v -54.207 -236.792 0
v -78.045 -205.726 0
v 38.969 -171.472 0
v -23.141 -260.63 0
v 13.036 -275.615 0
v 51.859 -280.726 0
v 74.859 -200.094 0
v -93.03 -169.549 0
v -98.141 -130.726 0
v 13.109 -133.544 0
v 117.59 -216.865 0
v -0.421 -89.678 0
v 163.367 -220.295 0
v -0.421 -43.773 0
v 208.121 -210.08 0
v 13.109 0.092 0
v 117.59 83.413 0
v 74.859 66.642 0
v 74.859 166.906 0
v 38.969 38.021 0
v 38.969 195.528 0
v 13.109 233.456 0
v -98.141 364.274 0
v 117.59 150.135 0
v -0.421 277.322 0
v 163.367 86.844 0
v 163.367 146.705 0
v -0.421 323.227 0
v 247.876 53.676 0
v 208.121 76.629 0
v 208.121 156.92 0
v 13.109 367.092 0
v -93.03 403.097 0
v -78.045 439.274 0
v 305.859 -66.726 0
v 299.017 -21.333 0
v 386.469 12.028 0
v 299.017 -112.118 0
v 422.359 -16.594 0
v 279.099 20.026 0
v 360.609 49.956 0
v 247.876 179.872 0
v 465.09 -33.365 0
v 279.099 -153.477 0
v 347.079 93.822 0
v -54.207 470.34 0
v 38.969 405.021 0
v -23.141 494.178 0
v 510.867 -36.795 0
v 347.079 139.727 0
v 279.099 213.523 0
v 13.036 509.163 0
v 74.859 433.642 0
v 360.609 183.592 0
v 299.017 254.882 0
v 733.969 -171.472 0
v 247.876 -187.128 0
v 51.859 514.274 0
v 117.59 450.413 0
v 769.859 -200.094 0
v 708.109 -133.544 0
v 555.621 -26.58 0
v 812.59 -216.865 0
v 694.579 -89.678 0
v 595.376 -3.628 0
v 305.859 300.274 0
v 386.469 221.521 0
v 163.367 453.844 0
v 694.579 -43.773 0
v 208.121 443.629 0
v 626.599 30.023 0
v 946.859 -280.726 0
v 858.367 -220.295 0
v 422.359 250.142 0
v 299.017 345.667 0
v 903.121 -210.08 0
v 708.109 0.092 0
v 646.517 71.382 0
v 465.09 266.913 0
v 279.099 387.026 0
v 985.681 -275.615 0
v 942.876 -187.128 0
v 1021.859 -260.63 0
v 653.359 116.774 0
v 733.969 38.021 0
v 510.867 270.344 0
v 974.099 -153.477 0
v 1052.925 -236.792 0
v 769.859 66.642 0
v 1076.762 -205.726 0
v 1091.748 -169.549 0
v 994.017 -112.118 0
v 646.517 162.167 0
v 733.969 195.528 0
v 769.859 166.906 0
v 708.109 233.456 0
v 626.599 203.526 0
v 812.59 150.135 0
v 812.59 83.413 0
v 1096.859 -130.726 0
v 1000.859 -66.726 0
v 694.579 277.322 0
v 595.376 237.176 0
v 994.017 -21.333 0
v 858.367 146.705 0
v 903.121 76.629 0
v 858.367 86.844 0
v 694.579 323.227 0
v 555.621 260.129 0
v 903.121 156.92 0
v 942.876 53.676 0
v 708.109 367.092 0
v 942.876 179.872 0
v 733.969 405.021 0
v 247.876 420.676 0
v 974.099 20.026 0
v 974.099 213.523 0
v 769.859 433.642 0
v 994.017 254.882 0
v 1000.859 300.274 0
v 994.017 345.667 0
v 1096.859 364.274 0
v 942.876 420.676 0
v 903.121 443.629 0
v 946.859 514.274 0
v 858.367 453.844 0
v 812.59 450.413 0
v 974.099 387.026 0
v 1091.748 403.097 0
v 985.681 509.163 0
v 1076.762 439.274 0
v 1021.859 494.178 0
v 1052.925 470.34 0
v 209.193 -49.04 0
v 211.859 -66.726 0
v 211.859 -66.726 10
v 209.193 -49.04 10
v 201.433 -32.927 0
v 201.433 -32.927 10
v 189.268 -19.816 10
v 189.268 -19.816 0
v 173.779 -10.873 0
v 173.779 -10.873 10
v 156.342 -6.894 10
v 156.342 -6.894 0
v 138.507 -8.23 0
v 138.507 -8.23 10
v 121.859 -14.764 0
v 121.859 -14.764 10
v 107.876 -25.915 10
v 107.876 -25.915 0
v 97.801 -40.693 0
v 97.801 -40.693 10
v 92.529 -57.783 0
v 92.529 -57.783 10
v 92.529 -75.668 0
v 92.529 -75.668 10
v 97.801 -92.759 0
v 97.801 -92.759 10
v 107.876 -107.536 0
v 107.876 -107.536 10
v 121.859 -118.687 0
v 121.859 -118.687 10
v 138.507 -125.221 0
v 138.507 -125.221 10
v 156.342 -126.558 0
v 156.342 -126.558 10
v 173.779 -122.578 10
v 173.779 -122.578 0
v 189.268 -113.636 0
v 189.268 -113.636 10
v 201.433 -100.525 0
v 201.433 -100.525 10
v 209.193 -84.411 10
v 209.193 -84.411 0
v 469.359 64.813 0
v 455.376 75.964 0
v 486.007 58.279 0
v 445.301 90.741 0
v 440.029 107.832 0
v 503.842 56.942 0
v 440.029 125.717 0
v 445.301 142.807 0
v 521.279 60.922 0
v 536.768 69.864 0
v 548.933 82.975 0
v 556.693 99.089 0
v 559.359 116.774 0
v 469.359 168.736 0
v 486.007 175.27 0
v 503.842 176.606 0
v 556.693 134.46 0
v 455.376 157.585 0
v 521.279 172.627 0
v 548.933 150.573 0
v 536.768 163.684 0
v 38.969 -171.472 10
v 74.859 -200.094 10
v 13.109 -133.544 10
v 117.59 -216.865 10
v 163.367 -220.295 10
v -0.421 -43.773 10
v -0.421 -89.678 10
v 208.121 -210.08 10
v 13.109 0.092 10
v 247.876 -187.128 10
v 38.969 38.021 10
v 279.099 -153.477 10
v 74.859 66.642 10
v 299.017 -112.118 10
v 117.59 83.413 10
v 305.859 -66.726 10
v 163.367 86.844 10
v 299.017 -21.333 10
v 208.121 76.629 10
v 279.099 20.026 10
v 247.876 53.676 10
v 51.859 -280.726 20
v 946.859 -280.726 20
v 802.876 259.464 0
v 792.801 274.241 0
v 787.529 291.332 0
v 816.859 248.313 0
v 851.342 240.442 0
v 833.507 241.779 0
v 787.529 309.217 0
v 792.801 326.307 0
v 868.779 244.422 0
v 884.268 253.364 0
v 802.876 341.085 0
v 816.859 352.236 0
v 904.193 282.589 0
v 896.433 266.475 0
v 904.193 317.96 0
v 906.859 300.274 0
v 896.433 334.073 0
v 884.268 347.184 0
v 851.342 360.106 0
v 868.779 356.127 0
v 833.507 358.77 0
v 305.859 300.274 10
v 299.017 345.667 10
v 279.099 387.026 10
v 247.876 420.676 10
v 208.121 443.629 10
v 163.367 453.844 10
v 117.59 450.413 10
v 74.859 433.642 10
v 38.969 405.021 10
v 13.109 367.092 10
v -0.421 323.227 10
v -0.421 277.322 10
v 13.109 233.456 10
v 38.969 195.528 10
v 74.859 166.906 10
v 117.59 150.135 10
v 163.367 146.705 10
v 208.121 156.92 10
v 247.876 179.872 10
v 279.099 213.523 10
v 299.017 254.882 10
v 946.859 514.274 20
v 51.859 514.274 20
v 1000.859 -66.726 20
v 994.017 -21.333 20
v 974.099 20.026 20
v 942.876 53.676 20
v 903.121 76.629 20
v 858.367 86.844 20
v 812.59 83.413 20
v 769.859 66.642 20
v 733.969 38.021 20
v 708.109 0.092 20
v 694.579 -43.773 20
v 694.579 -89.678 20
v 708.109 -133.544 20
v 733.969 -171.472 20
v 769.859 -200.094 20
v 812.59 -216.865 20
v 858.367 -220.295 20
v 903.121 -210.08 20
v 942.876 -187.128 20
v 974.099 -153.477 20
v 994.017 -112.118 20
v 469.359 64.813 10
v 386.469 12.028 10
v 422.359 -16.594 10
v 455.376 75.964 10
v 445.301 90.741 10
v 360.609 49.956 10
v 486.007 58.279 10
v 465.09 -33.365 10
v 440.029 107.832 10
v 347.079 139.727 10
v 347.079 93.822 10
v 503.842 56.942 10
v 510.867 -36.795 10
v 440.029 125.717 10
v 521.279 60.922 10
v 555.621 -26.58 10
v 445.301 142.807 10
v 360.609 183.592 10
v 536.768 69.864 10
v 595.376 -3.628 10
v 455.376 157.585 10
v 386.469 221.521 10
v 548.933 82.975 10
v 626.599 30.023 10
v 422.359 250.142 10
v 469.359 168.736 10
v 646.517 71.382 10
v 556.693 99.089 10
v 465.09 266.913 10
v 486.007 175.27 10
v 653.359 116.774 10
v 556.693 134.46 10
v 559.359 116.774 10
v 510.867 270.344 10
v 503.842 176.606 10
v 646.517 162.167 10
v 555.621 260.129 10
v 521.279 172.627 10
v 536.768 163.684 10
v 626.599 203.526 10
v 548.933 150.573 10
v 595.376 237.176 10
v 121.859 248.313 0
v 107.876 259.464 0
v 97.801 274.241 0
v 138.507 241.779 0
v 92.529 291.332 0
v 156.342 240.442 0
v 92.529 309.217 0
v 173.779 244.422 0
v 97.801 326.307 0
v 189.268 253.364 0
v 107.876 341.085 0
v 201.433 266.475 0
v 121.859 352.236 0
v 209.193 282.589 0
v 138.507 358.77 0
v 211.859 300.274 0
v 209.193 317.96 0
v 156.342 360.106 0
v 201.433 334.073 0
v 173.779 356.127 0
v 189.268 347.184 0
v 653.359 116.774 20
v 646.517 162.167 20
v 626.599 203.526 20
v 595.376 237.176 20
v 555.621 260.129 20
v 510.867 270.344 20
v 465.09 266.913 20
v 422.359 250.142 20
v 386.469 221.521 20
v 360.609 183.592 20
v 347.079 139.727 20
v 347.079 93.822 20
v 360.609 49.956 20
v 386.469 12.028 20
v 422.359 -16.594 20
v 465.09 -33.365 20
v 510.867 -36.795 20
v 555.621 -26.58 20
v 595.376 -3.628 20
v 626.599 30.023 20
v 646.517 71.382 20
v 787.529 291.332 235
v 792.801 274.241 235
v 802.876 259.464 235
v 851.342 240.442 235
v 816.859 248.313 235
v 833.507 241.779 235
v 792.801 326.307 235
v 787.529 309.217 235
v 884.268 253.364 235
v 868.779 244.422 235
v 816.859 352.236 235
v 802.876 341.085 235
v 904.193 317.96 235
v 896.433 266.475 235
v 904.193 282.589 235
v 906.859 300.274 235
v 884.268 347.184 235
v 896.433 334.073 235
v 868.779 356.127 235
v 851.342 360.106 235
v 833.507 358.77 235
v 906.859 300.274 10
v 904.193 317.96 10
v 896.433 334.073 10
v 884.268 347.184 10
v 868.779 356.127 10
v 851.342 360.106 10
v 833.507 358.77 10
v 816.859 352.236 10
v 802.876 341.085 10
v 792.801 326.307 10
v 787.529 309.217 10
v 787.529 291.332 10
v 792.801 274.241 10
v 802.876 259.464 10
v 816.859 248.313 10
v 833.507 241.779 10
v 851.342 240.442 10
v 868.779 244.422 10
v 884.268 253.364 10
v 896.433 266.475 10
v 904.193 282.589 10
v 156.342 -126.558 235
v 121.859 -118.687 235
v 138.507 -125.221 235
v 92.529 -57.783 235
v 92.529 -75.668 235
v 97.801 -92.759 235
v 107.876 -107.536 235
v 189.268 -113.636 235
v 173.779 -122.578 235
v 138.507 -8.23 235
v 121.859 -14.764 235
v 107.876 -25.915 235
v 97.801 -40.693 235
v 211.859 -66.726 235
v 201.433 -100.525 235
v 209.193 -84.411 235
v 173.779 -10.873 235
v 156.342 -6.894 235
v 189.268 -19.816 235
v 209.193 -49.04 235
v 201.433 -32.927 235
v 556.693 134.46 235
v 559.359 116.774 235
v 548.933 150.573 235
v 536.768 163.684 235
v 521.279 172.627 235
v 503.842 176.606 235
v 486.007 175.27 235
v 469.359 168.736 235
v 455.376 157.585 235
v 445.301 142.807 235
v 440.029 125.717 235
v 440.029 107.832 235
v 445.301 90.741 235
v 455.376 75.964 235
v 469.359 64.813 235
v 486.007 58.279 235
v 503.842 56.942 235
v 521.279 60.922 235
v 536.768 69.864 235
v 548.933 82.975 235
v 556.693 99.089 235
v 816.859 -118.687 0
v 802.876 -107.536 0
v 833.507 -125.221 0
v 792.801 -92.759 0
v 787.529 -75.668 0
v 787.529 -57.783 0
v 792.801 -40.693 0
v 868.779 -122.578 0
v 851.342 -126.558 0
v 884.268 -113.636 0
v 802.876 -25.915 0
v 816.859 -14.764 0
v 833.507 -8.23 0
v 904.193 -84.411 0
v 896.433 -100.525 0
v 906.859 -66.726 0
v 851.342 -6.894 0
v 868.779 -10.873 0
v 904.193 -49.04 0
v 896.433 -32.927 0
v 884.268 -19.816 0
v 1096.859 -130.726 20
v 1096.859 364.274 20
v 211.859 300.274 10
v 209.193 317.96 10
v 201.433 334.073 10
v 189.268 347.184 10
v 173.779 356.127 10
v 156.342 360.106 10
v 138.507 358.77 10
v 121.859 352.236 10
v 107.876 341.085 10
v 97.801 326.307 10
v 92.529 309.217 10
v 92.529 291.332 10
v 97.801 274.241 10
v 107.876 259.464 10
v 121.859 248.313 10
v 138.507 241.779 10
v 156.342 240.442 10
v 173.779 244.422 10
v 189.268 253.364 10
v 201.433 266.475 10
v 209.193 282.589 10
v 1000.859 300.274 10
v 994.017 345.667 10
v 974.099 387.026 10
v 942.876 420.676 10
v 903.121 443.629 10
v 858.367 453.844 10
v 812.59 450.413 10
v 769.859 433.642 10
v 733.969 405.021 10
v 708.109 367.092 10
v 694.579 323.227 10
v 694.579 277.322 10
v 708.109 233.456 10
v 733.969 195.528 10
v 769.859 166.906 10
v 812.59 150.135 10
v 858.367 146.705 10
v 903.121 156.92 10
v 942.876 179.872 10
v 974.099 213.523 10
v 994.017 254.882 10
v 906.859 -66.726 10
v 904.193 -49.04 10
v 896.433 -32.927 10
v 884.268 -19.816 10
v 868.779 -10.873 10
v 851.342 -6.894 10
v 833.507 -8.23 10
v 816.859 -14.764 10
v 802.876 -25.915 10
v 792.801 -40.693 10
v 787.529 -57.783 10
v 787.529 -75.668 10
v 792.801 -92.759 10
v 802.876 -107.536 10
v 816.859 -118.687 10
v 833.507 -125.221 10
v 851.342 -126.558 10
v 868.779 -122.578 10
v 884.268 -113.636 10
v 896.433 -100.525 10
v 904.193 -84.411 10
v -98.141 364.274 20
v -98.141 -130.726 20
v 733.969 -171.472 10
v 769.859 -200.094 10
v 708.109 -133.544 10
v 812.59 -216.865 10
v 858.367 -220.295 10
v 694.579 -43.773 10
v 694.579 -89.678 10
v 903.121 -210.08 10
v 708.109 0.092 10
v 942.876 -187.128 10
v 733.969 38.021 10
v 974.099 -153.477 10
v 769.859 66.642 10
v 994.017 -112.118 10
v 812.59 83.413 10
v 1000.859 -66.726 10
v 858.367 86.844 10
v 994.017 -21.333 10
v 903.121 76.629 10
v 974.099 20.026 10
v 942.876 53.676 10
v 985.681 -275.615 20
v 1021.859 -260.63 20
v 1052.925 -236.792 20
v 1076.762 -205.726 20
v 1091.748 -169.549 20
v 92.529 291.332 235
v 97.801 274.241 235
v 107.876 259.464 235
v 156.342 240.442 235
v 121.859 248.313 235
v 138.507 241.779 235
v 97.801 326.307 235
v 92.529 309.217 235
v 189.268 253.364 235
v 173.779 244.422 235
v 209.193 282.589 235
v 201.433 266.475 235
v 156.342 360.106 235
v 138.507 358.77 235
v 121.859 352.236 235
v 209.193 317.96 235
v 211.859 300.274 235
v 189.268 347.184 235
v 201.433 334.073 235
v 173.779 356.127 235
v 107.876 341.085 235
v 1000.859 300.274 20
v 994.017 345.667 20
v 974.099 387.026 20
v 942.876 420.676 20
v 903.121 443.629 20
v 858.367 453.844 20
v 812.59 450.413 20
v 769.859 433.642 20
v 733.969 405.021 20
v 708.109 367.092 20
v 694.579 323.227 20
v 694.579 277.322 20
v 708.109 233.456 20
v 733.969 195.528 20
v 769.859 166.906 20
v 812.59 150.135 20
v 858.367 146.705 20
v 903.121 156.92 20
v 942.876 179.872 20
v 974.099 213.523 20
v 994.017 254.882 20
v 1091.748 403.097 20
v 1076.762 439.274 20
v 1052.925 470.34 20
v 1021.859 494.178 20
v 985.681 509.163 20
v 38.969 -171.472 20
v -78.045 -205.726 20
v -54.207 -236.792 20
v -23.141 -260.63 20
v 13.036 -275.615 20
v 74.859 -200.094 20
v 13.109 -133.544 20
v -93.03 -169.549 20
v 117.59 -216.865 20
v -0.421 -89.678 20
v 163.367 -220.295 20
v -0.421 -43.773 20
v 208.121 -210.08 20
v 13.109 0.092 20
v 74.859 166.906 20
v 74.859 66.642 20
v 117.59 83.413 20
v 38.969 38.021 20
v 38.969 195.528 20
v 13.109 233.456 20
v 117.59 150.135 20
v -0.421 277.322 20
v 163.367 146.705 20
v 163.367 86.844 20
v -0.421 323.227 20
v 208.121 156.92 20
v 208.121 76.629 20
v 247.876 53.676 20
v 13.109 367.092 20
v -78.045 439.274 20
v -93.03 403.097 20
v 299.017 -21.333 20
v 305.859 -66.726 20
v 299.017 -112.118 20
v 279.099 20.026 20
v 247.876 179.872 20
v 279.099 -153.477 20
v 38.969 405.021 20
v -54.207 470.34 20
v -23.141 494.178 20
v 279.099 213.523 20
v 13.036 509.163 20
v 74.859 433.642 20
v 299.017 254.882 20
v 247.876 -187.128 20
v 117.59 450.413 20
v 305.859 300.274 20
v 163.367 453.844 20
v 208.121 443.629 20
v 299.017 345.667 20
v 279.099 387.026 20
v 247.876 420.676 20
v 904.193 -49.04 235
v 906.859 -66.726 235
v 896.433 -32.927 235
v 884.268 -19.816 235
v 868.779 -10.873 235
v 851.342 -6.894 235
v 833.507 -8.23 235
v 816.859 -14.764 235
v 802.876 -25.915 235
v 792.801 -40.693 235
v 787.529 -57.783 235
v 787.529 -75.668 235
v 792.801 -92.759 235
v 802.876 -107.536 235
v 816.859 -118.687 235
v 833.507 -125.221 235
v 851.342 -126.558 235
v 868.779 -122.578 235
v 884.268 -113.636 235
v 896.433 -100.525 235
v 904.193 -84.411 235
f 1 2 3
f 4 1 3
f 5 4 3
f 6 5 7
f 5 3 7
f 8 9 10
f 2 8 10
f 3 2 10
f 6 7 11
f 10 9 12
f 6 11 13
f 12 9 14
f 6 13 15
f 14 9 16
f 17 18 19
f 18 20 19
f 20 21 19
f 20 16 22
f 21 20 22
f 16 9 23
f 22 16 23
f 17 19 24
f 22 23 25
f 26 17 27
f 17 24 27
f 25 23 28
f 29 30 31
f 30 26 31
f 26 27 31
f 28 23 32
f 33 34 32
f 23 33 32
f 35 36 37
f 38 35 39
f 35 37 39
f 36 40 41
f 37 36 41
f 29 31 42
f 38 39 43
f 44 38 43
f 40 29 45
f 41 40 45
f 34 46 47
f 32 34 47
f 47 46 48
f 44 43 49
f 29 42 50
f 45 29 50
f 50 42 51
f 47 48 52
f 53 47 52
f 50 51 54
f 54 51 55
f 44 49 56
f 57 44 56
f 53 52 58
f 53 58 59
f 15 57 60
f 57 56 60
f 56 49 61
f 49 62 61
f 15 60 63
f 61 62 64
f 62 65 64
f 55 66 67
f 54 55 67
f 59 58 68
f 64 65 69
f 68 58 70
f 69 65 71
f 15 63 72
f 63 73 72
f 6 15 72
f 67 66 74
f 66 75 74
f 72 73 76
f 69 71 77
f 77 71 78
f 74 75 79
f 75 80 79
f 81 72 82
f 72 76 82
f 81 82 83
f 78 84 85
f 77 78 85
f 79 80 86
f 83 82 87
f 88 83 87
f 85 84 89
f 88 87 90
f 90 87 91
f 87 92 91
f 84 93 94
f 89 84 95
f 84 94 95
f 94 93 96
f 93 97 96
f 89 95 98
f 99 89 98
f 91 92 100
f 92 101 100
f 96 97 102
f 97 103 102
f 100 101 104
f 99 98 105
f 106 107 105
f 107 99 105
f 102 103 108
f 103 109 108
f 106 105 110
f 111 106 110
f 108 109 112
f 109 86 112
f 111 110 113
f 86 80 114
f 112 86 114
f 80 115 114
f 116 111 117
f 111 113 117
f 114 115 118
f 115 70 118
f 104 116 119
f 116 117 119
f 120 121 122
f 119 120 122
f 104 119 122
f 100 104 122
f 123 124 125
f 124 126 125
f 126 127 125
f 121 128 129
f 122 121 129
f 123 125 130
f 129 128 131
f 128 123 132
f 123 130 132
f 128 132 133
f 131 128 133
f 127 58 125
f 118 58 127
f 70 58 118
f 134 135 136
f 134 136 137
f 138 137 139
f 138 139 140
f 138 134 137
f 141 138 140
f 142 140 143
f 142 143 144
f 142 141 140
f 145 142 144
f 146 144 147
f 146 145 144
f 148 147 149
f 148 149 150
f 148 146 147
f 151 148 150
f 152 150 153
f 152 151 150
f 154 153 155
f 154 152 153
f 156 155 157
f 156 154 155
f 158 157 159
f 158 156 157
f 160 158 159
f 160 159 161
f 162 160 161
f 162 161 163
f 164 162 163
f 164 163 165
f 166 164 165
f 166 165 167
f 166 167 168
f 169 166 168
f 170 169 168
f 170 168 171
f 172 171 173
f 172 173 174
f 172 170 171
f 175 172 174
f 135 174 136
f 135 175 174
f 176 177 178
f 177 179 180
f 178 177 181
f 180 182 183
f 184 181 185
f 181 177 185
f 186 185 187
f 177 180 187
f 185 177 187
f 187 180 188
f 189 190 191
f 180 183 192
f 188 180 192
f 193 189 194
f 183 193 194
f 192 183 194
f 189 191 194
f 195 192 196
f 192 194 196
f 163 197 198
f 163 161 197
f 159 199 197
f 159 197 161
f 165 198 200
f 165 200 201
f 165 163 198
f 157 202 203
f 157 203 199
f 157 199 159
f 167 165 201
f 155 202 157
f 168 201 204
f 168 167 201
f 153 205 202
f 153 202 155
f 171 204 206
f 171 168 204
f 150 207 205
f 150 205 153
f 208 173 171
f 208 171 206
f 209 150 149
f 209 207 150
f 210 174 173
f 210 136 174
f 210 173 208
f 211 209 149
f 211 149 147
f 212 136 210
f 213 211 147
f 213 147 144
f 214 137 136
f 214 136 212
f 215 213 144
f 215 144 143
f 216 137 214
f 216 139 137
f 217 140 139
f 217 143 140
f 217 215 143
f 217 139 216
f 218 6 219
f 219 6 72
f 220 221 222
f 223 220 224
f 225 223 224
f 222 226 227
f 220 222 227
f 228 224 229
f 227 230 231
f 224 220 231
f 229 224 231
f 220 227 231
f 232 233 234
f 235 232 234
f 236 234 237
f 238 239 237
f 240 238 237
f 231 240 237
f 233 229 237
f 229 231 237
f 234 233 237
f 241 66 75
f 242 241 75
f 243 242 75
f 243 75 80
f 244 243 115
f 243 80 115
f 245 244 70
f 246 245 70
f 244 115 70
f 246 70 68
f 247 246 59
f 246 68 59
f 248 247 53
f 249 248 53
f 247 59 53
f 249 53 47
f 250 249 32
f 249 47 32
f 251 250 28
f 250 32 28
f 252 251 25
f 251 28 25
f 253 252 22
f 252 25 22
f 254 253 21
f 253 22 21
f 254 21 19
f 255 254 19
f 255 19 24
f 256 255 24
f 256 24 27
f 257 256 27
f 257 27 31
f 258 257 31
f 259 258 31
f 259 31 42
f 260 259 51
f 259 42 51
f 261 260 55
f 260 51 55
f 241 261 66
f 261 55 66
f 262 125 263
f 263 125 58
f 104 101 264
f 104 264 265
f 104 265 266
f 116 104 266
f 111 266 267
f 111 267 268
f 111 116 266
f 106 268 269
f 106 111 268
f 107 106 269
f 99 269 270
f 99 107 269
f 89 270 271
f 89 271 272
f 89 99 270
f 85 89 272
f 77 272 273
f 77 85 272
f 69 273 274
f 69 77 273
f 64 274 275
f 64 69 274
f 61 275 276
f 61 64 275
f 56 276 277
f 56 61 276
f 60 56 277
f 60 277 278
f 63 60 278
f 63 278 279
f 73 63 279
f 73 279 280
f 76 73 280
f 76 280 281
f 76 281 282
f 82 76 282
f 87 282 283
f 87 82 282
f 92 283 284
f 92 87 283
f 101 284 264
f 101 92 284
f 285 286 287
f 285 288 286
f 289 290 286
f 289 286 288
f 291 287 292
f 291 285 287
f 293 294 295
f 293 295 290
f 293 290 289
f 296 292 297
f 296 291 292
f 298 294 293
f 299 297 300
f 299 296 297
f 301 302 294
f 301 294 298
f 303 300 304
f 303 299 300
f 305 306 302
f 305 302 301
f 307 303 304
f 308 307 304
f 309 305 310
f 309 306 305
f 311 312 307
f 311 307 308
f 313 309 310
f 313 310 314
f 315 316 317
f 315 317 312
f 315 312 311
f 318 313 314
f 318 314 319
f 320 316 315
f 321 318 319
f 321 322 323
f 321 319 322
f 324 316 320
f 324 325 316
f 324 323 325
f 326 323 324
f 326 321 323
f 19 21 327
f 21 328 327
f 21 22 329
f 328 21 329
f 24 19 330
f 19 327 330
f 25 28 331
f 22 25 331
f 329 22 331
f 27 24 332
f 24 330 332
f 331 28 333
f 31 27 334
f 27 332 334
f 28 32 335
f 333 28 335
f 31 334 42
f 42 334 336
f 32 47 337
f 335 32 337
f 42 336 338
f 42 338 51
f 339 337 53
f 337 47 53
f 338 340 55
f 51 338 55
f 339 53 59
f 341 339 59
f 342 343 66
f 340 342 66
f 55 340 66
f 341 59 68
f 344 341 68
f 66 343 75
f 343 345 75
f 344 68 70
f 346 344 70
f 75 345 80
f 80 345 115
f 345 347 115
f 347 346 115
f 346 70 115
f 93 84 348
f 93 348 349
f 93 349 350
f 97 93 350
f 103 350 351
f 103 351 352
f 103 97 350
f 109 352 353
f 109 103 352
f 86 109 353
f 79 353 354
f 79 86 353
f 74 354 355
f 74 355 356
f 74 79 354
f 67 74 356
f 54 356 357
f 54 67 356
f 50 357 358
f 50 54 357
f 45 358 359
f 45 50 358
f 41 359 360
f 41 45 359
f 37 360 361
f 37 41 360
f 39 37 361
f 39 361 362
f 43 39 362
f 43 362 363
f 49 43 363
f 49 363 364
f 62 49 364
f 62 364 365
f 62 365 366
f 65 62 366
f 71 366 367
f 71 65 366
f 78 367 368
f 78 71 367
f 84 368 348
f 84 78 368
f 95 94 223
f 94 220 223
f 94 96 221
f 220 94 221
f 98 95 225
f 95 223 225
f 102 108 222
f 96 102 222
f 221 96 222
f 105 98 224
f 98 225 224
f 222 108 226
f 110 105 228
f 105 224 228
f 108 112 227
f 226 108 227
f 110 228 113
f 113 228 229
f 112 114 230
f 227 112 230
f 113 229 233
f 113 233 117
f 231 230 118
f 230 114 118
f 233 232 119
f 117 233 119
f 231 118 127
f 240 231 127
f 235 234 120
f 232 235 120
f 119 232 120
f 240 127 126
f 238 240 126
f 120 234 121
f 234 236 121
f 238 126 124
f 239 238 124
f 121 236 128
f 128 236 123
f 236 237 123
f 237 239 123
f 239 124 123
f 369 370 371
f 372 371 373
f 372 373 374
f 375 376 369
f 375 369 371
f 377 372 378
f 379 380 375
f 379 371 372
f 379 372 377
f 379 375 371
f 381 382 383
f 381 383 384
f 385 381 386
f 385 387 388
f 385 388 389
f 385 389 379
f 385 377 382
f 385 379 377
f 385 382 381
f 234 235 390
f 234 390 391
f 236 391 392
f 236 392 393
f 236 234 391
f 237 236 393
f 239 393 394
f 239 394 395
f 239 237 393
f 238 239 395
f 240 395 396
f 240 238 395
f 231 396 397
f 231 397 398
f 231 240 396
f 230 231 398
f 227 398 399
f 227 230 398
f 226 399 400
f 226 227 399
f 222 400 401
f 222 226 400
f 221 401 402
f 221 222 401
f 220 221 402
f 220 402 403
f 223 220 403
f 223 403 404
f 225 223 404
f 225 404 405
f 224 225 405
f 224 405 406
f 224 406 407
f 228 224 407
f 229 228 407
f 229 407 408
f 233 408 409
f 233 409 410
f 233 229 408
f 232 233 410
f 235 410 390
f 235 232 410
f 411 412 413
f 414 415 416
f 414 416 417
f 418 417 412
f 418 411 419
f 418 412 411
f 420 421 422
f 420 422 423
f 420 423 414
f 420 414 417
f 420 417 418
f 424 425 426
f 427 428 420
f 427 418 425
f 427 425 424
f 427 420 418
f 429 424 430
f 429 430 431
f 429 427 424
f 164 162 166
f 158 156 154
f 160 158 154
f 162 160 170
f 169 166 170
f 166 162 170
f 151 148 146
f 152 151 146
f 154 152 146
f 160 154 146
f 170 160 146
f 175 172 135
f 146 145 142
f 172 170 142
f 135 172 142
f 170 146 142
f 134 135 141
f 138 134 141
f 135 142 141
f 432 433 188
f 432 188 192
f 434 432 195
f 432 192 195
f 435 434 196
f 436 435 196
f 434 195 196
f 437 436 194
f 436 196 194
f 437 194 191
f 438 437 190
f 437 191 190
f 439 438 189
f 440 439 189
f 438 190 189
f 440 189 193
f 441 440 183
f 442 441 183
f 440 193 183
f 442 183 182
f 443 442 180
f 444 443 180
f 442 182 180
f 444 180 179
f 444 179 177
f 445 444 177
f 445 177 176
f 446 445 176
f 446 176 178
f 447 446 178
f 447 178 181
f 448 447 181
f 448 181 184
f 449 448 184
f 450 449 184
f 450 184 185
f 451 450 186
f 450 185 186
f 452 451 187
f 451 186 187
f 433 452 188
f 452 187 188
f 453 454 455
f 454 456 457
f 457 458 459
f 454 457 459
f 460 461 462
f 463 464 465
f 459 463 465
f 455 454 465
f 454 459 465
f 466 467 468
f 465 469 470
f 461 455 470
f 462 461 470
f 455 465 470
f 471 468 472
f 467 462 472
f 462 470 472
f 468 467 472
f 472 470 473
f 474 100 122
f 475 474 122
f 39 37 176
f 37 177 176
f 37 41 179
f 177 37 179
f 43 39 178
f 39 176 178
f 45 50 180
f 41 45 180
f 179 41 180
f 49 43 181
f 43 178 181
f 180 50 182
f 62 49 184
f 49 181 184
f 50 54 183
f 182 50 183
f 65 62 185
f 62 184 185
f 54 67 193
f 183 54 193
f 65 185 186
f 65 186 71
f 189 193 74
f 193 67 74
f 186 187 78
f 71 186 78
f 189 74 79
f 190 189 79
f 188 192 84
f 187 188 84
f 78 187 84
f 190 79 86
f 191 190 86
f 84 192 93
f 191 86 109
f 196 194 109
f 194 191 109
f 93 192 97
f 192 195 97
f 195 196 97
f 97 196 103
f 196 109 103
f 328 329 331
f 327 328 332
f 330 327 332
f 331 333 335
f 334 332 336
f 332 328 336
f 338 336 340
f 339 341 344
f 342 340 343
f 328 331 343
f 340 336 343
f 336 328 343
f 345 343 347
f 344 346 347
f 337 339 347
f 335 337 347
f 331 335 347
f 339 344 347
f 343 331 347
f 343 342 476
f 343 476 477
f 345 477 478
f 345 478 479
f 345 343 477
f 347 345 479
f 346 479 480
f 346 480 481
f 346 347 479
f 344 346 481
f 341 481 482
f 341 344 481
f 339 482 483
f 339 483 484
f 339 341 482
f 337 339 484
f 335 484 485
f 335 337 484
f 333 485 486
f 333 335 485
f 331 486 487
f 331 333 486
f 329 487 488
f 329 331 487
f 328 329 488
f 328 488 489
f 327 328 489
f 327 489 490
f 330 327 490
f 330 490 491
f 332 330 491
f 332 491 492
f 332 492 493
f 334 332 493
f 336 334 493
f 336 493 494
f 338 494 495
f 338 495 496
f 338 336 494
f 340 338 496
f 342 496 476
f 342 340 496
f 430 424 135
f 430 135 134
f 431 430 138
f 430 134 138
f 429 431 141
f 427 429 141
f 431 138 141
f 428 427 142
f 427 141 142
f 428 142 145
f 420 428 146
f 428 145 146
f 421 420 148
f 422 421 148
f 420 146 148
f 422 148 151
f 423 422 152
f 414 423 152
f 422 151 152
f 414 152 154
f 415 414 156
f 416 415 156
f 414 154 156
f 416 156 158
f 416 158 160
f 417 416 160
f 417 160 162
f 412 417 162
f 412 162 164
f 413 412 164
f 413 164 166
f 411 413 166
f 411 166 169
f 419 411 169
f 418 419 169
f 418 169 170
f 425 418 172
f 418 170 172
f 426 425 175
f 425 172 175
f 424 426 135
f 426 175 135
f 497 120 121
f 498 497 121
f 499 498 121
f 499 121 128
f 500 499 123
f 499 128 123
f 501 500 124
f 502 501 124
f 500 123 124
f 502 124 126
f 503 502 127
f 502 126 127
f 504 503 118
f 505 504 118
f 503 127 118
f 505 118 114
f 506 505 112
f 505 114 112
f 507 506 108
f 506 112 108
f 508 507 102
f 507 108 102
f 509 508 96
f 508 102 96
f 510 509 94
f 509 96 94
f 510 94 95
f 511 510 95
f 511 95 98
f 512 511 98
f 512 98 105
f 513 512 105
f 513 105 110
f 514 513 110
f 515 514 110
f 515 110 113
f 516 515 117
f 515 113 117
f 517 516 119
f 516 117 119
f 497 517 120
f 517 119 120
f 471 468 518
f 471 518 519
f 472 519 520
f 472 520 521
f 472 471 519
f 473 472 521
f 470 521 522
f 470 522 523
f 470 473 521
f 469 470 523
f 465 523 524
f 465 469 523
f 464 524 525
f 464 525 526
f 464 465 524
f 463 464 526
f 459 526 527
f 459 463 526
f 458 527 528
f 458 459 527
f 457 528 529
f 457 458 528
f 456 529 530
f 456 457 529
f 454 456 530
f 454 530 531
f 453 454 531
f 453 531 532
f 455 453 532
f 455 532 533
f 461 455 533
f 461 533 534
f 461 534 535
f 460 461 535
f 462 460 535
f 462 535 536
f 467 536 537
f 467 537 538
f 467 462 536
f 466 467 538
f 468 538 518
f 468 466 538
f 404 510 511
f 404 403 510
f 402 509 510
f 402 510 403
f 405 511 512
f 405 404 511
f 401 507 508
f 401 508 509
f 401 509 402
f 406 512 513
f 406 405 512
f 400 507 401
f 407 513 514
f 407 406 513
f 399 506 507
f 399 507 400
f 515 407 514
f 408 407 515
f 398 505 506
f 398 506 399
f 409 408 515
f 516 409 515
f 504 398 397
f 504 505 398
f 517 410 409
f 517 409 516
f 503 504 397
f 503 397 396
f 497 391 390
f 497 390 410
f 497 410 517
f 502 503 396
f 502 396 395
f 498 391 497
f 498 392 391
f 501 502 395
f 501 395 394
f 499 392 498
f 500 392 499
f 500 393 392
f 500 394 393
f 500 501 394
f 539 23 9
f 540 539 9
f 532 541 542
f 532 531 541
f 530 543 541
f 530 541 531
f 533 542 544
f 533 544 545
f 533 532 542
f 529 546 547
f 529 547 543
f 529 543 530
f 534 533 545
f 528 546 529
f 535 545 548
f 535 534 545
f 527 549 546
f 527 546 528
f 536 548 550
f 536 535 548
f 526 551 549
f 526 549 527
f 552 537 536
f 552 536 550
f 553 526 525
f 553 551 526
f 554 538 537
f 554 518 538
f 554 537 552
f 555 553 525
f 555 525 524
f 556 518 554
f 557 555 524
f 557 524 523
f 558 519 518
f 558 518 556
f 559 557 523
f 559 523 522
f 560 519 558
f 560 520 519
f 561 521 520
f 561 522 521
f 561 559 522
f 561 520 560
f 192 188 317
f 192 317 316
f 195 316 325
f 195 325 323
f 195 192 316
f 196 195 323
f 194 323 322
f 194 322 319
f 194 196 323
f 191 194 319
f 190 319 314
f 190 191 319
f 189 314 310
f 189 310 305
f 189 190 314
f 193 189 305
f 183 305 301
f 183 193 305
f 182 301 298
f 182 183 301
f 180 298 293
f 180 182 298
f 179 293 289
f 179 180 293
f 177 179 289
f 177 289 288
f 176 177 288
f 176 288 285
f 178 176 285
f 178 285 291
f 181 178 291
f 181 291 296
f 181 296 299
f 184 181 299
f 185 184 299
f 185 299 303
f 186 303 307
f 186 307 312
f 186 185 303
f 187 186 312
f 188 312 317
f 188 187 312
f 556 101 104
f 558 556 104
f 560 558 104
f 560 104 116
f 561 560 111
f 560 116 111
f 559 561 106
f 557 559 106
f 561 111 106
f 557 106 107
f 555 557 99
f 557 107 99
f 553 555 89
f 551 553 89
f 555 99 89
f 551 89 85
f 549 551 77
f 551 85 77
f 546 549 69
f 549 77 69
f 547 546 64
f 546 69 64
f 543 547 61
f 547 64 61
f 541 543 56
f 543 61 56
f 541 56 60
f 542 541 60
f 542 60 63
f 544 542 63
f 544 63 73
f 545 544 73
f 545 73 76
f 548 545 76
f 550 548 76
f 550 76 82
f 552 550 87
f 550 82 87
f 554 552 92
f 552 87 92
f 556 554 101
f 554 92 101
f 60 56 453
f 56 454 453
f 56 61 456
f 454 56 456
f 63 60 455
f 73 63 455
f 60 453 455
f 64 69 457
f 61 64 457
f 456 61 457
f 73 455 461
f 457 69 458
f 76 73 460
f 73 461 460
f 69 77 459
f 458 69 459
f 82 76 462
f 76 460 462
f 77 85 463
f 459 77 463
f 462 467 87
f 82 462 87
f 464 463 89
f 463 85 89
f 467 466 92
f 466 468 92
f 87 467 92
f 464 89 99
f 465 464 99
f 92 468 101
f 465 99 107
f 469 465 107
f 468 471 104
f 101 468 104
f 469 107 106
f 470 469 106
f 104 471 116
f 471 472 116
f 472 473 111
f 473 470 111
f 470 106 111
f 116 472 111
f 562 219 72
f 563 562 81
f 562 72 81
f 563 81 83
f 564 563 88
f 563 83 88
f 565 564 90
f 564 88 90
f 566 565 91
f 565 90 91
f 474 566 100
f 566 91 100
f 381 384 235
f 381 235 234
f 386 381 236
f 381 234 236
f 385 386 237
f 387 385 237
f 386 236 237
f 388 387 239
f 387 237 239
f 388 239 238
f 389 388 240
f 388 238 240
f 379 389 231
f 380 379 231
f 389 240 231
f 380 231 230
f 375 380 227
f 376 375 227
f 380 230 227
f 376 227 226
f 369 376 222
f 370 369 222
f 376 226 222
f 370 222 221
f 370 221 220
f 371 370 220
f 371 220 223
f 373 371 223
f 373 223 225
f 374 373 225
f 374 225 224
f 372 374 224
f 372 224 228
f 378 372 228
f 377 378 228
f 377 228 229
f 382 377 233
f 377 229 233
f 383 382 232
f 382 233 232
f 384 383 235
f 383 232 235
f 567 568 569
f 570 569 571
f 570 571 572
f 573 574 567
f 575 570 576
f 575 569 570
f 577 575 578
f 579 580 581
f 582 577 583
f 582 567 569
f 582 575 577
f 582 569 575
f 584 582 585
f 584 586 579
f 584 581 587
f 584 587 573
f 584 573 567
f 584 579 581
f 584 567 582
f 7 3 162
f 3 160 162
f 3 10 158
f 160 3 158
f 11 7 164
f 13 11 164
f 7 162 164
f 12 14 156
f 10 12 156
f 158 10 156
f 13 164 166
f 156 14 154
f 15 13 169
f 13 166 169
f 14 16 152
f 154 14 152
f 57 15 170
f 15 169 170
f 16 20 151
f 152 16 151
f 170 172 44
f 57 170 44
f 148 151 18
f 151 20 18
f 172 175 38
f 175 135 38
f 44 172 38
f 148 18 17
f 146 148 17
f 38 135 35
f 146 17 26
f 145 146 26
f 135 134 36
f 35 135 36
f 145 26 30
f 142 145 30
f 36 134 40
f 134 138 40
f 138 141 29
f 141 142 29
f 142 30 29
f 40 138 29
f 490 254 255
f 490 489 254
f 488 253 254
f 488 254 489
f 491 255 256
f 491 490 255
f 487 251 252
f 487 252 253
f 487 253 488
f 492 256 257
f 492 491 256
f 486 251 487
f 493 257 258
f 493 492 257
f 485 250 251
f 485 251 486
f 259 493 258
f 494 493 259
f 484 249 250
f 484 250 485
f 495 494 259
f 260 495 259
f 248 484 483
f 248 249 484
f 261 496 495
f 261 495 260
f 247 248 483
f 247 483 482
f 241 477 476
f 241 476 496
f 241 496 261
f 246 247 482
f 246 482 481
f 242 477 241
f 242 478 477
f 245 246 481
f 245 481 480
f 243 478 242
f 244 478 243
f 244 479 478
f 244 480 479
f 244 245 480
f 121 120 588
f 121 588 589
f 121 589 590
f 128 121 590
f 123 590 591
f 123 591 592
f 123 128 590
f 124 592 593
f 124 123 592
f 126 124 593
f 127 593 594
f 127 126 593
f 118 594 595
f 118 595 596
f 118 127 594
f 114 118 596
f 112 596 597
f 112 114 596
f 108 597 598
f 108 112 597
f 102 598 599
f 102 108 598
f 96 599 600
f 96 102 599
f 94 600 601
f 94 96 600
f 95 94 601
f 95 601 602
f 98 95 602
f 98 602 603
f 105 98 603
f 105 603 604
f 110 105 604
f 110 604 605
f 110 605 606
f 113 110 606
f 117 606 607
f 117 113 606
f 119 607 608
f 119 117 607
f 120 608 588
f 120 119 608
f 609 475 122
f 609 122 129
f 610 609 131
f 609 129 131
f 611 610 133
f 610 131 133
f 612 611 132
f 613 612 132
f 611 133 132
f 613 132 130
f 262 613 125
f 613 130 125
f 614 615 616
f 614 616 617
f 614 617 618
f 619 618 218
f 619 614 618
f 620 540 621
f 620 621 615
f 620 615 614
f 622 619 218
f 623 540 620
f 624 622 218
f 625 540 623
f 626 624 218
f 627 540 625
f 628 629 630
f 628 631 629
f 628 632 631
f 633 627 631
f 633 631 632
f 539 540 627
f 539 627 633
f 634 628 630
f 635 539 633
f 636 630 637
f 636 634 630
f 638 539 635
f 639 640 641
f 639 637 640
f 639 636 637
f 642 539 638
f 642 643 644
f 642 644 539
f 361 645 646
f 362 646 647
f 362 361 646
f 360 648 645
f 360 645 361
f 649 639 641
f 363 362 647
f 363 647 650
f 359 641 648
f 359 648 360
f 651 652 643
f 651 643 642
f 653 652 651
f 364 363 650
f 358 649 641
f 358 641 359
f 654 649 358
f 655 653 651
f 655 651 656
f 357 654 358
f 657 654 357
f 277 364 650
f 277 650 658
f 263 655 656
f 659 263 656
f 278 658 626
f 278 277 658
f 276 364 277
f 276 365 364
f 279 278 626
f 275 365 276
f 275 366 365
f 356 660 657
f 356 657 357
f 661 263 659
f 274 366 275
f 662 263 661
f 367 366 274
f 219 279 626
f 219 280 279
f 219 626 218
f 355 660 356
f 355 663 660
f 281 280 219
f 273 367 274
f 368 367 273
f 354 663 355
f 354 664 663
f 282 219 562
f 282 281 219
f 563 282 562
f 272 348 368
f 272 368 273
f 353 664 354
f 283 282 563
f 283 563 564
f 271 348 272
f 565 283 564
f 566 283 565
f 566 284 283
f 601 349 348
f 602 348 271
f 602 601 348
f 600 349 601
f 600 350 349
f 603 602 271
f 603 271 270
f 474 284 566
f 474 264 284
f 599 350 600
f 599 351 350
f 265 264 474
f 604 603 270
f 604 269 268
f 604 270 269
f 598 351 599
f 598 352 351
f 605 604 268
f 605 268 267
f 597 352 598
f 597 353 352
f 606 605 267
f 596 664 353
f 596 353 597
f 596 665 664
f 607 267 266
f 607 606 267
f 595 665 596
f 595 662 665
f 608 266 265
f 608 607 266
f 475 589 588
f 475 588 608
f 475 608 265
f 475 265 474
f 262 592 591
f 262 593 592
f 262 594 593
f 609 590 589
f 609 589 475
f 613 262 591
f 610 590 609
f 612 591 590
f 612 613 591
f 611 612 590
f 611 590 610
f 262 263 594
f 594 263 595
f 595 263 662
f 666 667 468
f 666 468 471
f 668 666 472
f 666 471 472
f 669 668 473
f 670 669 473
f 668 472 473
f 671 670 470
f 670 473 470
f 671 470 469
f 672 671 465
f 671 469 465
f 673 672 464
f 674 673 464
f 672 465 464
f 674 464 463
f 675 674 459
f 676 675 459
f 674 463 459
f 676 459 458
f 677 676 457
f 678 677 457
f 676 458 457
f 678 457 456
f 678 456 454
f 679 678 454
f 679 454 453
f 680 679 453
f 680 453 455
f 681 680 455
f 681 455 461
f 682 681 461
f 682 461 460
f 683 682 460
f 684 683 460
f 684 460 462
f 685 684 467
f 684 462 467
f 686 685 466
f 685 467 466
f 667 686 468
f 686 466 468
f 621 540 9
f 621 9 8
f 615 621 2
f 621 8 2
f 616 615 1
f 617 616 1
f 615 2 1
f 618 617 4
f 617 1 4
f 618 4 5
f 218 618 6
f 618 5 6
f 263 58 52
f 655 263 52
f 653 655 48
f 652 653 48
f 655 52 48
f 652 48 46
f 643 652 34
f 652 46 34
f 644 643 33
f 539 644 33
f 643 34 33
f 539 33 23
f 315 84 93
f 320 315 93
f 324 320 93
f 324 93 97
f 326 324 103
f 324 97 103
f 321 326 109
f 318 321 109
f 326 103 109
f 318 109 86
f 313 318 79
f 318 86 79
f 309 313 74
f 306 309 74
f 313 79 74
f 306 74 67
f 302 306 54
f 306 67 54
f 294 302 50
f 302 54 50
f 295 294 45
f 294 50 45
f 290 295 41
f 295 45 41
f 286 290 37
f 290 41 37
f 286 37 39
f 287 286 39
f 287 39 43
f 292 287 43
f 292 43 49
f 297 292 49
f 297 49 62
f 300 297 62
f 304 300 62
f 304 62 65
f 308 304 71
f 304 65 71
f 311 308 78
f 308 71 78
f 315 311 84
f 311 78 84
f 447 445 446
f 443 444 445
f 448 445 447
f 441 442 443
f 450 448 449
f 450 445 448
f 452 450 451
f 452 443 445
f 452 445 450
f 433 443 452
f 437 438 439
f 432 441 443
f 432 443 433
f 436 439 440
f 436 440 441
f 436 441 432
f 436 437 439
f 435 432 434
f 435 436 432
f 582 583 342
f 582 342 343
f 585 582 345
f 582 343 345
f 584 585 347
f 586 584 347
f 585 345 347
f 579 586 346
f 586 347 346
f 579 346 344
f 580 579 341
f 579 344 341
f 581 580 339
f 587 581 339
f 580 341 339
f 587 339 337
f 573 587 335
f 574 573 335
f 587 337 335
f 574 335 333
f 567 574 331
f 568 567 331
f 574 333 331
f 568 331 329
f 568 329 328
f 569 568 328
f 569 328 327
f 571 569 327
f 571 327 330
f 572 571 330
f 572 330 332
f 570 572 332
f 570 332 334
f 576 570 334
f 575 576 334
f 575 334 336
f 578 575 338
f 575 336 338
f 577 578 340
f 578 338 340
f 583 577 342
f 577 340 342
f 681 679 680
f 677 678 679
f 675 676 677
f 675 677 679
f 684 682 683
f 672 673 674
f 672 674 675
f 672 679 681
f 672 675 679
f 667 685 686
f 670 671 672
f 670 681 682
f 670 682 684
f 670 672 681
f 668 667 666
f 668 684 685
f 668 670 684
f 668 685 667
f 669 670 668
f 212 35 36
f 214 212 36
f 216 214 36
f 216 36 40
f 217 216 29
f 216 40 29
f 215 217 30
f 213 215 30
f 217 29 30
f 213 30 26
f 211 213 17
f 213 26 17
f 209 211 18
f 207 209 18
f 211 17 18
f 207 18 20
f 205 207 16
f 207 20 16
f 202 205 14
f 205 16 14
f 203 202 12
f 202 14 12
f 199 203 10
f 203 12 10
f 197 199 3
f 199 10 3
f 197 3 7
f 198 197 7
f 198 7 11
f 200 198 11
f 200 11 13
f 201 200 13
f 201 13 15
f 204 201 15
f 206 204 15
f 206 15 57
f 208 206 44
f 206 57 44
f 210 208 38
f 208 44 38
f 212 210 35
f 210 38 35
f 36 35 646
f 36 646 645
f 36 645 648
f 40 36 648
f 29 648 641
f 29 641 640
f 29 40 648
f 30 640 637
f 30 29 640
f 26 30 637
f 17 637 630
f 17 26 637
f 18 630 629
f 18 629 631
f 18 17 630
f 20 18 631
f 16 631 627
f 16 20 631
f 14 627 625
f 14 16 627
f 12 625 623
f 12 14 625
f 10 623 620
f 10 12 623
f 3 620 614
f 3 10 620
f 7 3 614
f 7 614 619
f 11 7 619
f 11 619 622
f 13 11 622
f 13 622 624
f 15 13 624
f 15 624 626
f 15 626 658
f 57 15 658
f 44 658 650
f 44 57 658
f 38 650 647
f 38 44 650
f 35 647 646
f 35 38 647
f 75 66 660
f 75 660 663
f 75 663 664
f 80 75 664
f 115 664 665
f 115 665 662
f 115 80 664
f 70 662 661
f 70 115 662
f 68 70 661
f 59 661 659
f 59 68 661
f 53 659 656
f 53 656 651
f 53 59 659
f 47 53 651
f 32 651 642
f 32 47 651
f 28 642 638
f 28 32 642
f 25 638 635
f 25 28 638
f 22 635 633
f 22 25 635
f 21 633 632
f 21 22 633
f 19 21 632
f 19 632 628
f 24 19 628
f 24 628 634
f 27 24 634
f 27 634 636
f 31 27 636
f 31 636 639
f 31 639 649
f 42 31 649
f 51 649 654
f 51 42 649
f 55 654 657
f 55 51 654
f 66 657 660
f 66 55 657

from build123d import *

# Parameters (mm, degrees)
F0_R     = 154
F1_DEPTH = 20
F0_R_2   = 60
F2_DEPTH = 235
F3_DEPTH = 10


with BuildPart() as f1:
    # F0 (on Top) → F1 (new body)
    with BuildSketch(Plane.XY):
        with BuildLine():
            Line((946.858641, 514.274256), (51.858641, 514.274256))
            ThreePointArc((51.858641, 514.274256), (-54.207376, 470.340273), (-98.141359, 364.274256))
            Line((-98.141359, 364.274256), (-98.141359, -130.725744))
            ThreePointArc((-98.141359, -130.725744), (-54.207376, -236.791761), (51.858641, -280.725744))
            Line((51.858641, -280.725744), (946.858641, -280.725744))
            ThreePointArc((946.858641, -280.725744), (1052.924658, -236.791761), (1096.858641, -130.725744))
            Line((1096.858641, -130.725744), (1096.858641, 364.274256))
            ThreePointArc((1096.858641, 364.274256), (1052.924658, 470.340273), (946.858641, 514.274256))
        make_face()
        with Locations((151.858641, -66.725744)):
            Circle(F0_R, mode=Mode.SUBTRACT)
        with Locations((846.858641, -66.725744)):
            Circle(F0_R, mode=Mode.SUBTRACT)
        with Locations((151.858641, 300.274256)):
            Circle(F0_R, mode=Mode.SUBTRACT)
        with Locations((499.358641, 116.774256)):
            Circle(F0_R, mode=Mode.SUBTRACT)
        with Locations((846.858641, 300.274256)):
            Circle(F0_R, mode=Mode.SUBTRACT)
    extrude(amount=F1_DEPTH)


with BuildPart() as f2:
    # F0 (on Top) → F2 (new body)
    with BuildSketch(Plane.XY):
        with Locations((846.858641, -66.725744)):
            Circle(F0_R_2)
        with Locations((846.858641, 300.274256)):
            Circle(F0_R_2)
        with Locations((499.358641, 116.774256)):
            Circle(F0_R_2)
        with Locations((151.858641, -66.725744)):
            Circle(F0_R_2)
        with Locations((151.858641, 300.274256)):
            Circle(F0_R_2)
    extrude(amount=F2_DEPTH)


with BuildPart() as f3:
    # F0 (on Top) → F3 (new body)
    with BuildSketch(Plane.XY):
        with Locations((151.858641, 300.274256)):
            Circle(F0_R)
        with Locations((151.858641, 300.274256)):
            Circle(F0_R_2, mode=Mode.SUBTRACT)
        with Locations((151.858641, -66.725744)):
            Circle(F0_R)
        with Locations((151.858641, -66.725744)):
            Circle(F0_R_2, mode=Mode.SUBTRACT)
        with Locations((499.358641, 116.774256)):
            Circle(F0_R)
        with Locations((499.358641, 116.774256)):
            Circle(F0_R_2, mode=Mode.SUBTRACT)
        with Locations((846.858641, 300.274256)):
            Circle(F0_R)
        with Locations((846.858641, 300.274256)):
            Circle(F0_R_2, mode=Mode.SUBTRACT)
        with Locations((846.858641, -66.725744)):
            Circle(F0_R)
        with Locations((846.858641, -66.725744)):
            Circle(F0_R_2, mode=Mode.SUBTRACT)
    extrude(amount=F3_DEPTH)


solid = Compound([f1.part, f2.part, f3.part])
